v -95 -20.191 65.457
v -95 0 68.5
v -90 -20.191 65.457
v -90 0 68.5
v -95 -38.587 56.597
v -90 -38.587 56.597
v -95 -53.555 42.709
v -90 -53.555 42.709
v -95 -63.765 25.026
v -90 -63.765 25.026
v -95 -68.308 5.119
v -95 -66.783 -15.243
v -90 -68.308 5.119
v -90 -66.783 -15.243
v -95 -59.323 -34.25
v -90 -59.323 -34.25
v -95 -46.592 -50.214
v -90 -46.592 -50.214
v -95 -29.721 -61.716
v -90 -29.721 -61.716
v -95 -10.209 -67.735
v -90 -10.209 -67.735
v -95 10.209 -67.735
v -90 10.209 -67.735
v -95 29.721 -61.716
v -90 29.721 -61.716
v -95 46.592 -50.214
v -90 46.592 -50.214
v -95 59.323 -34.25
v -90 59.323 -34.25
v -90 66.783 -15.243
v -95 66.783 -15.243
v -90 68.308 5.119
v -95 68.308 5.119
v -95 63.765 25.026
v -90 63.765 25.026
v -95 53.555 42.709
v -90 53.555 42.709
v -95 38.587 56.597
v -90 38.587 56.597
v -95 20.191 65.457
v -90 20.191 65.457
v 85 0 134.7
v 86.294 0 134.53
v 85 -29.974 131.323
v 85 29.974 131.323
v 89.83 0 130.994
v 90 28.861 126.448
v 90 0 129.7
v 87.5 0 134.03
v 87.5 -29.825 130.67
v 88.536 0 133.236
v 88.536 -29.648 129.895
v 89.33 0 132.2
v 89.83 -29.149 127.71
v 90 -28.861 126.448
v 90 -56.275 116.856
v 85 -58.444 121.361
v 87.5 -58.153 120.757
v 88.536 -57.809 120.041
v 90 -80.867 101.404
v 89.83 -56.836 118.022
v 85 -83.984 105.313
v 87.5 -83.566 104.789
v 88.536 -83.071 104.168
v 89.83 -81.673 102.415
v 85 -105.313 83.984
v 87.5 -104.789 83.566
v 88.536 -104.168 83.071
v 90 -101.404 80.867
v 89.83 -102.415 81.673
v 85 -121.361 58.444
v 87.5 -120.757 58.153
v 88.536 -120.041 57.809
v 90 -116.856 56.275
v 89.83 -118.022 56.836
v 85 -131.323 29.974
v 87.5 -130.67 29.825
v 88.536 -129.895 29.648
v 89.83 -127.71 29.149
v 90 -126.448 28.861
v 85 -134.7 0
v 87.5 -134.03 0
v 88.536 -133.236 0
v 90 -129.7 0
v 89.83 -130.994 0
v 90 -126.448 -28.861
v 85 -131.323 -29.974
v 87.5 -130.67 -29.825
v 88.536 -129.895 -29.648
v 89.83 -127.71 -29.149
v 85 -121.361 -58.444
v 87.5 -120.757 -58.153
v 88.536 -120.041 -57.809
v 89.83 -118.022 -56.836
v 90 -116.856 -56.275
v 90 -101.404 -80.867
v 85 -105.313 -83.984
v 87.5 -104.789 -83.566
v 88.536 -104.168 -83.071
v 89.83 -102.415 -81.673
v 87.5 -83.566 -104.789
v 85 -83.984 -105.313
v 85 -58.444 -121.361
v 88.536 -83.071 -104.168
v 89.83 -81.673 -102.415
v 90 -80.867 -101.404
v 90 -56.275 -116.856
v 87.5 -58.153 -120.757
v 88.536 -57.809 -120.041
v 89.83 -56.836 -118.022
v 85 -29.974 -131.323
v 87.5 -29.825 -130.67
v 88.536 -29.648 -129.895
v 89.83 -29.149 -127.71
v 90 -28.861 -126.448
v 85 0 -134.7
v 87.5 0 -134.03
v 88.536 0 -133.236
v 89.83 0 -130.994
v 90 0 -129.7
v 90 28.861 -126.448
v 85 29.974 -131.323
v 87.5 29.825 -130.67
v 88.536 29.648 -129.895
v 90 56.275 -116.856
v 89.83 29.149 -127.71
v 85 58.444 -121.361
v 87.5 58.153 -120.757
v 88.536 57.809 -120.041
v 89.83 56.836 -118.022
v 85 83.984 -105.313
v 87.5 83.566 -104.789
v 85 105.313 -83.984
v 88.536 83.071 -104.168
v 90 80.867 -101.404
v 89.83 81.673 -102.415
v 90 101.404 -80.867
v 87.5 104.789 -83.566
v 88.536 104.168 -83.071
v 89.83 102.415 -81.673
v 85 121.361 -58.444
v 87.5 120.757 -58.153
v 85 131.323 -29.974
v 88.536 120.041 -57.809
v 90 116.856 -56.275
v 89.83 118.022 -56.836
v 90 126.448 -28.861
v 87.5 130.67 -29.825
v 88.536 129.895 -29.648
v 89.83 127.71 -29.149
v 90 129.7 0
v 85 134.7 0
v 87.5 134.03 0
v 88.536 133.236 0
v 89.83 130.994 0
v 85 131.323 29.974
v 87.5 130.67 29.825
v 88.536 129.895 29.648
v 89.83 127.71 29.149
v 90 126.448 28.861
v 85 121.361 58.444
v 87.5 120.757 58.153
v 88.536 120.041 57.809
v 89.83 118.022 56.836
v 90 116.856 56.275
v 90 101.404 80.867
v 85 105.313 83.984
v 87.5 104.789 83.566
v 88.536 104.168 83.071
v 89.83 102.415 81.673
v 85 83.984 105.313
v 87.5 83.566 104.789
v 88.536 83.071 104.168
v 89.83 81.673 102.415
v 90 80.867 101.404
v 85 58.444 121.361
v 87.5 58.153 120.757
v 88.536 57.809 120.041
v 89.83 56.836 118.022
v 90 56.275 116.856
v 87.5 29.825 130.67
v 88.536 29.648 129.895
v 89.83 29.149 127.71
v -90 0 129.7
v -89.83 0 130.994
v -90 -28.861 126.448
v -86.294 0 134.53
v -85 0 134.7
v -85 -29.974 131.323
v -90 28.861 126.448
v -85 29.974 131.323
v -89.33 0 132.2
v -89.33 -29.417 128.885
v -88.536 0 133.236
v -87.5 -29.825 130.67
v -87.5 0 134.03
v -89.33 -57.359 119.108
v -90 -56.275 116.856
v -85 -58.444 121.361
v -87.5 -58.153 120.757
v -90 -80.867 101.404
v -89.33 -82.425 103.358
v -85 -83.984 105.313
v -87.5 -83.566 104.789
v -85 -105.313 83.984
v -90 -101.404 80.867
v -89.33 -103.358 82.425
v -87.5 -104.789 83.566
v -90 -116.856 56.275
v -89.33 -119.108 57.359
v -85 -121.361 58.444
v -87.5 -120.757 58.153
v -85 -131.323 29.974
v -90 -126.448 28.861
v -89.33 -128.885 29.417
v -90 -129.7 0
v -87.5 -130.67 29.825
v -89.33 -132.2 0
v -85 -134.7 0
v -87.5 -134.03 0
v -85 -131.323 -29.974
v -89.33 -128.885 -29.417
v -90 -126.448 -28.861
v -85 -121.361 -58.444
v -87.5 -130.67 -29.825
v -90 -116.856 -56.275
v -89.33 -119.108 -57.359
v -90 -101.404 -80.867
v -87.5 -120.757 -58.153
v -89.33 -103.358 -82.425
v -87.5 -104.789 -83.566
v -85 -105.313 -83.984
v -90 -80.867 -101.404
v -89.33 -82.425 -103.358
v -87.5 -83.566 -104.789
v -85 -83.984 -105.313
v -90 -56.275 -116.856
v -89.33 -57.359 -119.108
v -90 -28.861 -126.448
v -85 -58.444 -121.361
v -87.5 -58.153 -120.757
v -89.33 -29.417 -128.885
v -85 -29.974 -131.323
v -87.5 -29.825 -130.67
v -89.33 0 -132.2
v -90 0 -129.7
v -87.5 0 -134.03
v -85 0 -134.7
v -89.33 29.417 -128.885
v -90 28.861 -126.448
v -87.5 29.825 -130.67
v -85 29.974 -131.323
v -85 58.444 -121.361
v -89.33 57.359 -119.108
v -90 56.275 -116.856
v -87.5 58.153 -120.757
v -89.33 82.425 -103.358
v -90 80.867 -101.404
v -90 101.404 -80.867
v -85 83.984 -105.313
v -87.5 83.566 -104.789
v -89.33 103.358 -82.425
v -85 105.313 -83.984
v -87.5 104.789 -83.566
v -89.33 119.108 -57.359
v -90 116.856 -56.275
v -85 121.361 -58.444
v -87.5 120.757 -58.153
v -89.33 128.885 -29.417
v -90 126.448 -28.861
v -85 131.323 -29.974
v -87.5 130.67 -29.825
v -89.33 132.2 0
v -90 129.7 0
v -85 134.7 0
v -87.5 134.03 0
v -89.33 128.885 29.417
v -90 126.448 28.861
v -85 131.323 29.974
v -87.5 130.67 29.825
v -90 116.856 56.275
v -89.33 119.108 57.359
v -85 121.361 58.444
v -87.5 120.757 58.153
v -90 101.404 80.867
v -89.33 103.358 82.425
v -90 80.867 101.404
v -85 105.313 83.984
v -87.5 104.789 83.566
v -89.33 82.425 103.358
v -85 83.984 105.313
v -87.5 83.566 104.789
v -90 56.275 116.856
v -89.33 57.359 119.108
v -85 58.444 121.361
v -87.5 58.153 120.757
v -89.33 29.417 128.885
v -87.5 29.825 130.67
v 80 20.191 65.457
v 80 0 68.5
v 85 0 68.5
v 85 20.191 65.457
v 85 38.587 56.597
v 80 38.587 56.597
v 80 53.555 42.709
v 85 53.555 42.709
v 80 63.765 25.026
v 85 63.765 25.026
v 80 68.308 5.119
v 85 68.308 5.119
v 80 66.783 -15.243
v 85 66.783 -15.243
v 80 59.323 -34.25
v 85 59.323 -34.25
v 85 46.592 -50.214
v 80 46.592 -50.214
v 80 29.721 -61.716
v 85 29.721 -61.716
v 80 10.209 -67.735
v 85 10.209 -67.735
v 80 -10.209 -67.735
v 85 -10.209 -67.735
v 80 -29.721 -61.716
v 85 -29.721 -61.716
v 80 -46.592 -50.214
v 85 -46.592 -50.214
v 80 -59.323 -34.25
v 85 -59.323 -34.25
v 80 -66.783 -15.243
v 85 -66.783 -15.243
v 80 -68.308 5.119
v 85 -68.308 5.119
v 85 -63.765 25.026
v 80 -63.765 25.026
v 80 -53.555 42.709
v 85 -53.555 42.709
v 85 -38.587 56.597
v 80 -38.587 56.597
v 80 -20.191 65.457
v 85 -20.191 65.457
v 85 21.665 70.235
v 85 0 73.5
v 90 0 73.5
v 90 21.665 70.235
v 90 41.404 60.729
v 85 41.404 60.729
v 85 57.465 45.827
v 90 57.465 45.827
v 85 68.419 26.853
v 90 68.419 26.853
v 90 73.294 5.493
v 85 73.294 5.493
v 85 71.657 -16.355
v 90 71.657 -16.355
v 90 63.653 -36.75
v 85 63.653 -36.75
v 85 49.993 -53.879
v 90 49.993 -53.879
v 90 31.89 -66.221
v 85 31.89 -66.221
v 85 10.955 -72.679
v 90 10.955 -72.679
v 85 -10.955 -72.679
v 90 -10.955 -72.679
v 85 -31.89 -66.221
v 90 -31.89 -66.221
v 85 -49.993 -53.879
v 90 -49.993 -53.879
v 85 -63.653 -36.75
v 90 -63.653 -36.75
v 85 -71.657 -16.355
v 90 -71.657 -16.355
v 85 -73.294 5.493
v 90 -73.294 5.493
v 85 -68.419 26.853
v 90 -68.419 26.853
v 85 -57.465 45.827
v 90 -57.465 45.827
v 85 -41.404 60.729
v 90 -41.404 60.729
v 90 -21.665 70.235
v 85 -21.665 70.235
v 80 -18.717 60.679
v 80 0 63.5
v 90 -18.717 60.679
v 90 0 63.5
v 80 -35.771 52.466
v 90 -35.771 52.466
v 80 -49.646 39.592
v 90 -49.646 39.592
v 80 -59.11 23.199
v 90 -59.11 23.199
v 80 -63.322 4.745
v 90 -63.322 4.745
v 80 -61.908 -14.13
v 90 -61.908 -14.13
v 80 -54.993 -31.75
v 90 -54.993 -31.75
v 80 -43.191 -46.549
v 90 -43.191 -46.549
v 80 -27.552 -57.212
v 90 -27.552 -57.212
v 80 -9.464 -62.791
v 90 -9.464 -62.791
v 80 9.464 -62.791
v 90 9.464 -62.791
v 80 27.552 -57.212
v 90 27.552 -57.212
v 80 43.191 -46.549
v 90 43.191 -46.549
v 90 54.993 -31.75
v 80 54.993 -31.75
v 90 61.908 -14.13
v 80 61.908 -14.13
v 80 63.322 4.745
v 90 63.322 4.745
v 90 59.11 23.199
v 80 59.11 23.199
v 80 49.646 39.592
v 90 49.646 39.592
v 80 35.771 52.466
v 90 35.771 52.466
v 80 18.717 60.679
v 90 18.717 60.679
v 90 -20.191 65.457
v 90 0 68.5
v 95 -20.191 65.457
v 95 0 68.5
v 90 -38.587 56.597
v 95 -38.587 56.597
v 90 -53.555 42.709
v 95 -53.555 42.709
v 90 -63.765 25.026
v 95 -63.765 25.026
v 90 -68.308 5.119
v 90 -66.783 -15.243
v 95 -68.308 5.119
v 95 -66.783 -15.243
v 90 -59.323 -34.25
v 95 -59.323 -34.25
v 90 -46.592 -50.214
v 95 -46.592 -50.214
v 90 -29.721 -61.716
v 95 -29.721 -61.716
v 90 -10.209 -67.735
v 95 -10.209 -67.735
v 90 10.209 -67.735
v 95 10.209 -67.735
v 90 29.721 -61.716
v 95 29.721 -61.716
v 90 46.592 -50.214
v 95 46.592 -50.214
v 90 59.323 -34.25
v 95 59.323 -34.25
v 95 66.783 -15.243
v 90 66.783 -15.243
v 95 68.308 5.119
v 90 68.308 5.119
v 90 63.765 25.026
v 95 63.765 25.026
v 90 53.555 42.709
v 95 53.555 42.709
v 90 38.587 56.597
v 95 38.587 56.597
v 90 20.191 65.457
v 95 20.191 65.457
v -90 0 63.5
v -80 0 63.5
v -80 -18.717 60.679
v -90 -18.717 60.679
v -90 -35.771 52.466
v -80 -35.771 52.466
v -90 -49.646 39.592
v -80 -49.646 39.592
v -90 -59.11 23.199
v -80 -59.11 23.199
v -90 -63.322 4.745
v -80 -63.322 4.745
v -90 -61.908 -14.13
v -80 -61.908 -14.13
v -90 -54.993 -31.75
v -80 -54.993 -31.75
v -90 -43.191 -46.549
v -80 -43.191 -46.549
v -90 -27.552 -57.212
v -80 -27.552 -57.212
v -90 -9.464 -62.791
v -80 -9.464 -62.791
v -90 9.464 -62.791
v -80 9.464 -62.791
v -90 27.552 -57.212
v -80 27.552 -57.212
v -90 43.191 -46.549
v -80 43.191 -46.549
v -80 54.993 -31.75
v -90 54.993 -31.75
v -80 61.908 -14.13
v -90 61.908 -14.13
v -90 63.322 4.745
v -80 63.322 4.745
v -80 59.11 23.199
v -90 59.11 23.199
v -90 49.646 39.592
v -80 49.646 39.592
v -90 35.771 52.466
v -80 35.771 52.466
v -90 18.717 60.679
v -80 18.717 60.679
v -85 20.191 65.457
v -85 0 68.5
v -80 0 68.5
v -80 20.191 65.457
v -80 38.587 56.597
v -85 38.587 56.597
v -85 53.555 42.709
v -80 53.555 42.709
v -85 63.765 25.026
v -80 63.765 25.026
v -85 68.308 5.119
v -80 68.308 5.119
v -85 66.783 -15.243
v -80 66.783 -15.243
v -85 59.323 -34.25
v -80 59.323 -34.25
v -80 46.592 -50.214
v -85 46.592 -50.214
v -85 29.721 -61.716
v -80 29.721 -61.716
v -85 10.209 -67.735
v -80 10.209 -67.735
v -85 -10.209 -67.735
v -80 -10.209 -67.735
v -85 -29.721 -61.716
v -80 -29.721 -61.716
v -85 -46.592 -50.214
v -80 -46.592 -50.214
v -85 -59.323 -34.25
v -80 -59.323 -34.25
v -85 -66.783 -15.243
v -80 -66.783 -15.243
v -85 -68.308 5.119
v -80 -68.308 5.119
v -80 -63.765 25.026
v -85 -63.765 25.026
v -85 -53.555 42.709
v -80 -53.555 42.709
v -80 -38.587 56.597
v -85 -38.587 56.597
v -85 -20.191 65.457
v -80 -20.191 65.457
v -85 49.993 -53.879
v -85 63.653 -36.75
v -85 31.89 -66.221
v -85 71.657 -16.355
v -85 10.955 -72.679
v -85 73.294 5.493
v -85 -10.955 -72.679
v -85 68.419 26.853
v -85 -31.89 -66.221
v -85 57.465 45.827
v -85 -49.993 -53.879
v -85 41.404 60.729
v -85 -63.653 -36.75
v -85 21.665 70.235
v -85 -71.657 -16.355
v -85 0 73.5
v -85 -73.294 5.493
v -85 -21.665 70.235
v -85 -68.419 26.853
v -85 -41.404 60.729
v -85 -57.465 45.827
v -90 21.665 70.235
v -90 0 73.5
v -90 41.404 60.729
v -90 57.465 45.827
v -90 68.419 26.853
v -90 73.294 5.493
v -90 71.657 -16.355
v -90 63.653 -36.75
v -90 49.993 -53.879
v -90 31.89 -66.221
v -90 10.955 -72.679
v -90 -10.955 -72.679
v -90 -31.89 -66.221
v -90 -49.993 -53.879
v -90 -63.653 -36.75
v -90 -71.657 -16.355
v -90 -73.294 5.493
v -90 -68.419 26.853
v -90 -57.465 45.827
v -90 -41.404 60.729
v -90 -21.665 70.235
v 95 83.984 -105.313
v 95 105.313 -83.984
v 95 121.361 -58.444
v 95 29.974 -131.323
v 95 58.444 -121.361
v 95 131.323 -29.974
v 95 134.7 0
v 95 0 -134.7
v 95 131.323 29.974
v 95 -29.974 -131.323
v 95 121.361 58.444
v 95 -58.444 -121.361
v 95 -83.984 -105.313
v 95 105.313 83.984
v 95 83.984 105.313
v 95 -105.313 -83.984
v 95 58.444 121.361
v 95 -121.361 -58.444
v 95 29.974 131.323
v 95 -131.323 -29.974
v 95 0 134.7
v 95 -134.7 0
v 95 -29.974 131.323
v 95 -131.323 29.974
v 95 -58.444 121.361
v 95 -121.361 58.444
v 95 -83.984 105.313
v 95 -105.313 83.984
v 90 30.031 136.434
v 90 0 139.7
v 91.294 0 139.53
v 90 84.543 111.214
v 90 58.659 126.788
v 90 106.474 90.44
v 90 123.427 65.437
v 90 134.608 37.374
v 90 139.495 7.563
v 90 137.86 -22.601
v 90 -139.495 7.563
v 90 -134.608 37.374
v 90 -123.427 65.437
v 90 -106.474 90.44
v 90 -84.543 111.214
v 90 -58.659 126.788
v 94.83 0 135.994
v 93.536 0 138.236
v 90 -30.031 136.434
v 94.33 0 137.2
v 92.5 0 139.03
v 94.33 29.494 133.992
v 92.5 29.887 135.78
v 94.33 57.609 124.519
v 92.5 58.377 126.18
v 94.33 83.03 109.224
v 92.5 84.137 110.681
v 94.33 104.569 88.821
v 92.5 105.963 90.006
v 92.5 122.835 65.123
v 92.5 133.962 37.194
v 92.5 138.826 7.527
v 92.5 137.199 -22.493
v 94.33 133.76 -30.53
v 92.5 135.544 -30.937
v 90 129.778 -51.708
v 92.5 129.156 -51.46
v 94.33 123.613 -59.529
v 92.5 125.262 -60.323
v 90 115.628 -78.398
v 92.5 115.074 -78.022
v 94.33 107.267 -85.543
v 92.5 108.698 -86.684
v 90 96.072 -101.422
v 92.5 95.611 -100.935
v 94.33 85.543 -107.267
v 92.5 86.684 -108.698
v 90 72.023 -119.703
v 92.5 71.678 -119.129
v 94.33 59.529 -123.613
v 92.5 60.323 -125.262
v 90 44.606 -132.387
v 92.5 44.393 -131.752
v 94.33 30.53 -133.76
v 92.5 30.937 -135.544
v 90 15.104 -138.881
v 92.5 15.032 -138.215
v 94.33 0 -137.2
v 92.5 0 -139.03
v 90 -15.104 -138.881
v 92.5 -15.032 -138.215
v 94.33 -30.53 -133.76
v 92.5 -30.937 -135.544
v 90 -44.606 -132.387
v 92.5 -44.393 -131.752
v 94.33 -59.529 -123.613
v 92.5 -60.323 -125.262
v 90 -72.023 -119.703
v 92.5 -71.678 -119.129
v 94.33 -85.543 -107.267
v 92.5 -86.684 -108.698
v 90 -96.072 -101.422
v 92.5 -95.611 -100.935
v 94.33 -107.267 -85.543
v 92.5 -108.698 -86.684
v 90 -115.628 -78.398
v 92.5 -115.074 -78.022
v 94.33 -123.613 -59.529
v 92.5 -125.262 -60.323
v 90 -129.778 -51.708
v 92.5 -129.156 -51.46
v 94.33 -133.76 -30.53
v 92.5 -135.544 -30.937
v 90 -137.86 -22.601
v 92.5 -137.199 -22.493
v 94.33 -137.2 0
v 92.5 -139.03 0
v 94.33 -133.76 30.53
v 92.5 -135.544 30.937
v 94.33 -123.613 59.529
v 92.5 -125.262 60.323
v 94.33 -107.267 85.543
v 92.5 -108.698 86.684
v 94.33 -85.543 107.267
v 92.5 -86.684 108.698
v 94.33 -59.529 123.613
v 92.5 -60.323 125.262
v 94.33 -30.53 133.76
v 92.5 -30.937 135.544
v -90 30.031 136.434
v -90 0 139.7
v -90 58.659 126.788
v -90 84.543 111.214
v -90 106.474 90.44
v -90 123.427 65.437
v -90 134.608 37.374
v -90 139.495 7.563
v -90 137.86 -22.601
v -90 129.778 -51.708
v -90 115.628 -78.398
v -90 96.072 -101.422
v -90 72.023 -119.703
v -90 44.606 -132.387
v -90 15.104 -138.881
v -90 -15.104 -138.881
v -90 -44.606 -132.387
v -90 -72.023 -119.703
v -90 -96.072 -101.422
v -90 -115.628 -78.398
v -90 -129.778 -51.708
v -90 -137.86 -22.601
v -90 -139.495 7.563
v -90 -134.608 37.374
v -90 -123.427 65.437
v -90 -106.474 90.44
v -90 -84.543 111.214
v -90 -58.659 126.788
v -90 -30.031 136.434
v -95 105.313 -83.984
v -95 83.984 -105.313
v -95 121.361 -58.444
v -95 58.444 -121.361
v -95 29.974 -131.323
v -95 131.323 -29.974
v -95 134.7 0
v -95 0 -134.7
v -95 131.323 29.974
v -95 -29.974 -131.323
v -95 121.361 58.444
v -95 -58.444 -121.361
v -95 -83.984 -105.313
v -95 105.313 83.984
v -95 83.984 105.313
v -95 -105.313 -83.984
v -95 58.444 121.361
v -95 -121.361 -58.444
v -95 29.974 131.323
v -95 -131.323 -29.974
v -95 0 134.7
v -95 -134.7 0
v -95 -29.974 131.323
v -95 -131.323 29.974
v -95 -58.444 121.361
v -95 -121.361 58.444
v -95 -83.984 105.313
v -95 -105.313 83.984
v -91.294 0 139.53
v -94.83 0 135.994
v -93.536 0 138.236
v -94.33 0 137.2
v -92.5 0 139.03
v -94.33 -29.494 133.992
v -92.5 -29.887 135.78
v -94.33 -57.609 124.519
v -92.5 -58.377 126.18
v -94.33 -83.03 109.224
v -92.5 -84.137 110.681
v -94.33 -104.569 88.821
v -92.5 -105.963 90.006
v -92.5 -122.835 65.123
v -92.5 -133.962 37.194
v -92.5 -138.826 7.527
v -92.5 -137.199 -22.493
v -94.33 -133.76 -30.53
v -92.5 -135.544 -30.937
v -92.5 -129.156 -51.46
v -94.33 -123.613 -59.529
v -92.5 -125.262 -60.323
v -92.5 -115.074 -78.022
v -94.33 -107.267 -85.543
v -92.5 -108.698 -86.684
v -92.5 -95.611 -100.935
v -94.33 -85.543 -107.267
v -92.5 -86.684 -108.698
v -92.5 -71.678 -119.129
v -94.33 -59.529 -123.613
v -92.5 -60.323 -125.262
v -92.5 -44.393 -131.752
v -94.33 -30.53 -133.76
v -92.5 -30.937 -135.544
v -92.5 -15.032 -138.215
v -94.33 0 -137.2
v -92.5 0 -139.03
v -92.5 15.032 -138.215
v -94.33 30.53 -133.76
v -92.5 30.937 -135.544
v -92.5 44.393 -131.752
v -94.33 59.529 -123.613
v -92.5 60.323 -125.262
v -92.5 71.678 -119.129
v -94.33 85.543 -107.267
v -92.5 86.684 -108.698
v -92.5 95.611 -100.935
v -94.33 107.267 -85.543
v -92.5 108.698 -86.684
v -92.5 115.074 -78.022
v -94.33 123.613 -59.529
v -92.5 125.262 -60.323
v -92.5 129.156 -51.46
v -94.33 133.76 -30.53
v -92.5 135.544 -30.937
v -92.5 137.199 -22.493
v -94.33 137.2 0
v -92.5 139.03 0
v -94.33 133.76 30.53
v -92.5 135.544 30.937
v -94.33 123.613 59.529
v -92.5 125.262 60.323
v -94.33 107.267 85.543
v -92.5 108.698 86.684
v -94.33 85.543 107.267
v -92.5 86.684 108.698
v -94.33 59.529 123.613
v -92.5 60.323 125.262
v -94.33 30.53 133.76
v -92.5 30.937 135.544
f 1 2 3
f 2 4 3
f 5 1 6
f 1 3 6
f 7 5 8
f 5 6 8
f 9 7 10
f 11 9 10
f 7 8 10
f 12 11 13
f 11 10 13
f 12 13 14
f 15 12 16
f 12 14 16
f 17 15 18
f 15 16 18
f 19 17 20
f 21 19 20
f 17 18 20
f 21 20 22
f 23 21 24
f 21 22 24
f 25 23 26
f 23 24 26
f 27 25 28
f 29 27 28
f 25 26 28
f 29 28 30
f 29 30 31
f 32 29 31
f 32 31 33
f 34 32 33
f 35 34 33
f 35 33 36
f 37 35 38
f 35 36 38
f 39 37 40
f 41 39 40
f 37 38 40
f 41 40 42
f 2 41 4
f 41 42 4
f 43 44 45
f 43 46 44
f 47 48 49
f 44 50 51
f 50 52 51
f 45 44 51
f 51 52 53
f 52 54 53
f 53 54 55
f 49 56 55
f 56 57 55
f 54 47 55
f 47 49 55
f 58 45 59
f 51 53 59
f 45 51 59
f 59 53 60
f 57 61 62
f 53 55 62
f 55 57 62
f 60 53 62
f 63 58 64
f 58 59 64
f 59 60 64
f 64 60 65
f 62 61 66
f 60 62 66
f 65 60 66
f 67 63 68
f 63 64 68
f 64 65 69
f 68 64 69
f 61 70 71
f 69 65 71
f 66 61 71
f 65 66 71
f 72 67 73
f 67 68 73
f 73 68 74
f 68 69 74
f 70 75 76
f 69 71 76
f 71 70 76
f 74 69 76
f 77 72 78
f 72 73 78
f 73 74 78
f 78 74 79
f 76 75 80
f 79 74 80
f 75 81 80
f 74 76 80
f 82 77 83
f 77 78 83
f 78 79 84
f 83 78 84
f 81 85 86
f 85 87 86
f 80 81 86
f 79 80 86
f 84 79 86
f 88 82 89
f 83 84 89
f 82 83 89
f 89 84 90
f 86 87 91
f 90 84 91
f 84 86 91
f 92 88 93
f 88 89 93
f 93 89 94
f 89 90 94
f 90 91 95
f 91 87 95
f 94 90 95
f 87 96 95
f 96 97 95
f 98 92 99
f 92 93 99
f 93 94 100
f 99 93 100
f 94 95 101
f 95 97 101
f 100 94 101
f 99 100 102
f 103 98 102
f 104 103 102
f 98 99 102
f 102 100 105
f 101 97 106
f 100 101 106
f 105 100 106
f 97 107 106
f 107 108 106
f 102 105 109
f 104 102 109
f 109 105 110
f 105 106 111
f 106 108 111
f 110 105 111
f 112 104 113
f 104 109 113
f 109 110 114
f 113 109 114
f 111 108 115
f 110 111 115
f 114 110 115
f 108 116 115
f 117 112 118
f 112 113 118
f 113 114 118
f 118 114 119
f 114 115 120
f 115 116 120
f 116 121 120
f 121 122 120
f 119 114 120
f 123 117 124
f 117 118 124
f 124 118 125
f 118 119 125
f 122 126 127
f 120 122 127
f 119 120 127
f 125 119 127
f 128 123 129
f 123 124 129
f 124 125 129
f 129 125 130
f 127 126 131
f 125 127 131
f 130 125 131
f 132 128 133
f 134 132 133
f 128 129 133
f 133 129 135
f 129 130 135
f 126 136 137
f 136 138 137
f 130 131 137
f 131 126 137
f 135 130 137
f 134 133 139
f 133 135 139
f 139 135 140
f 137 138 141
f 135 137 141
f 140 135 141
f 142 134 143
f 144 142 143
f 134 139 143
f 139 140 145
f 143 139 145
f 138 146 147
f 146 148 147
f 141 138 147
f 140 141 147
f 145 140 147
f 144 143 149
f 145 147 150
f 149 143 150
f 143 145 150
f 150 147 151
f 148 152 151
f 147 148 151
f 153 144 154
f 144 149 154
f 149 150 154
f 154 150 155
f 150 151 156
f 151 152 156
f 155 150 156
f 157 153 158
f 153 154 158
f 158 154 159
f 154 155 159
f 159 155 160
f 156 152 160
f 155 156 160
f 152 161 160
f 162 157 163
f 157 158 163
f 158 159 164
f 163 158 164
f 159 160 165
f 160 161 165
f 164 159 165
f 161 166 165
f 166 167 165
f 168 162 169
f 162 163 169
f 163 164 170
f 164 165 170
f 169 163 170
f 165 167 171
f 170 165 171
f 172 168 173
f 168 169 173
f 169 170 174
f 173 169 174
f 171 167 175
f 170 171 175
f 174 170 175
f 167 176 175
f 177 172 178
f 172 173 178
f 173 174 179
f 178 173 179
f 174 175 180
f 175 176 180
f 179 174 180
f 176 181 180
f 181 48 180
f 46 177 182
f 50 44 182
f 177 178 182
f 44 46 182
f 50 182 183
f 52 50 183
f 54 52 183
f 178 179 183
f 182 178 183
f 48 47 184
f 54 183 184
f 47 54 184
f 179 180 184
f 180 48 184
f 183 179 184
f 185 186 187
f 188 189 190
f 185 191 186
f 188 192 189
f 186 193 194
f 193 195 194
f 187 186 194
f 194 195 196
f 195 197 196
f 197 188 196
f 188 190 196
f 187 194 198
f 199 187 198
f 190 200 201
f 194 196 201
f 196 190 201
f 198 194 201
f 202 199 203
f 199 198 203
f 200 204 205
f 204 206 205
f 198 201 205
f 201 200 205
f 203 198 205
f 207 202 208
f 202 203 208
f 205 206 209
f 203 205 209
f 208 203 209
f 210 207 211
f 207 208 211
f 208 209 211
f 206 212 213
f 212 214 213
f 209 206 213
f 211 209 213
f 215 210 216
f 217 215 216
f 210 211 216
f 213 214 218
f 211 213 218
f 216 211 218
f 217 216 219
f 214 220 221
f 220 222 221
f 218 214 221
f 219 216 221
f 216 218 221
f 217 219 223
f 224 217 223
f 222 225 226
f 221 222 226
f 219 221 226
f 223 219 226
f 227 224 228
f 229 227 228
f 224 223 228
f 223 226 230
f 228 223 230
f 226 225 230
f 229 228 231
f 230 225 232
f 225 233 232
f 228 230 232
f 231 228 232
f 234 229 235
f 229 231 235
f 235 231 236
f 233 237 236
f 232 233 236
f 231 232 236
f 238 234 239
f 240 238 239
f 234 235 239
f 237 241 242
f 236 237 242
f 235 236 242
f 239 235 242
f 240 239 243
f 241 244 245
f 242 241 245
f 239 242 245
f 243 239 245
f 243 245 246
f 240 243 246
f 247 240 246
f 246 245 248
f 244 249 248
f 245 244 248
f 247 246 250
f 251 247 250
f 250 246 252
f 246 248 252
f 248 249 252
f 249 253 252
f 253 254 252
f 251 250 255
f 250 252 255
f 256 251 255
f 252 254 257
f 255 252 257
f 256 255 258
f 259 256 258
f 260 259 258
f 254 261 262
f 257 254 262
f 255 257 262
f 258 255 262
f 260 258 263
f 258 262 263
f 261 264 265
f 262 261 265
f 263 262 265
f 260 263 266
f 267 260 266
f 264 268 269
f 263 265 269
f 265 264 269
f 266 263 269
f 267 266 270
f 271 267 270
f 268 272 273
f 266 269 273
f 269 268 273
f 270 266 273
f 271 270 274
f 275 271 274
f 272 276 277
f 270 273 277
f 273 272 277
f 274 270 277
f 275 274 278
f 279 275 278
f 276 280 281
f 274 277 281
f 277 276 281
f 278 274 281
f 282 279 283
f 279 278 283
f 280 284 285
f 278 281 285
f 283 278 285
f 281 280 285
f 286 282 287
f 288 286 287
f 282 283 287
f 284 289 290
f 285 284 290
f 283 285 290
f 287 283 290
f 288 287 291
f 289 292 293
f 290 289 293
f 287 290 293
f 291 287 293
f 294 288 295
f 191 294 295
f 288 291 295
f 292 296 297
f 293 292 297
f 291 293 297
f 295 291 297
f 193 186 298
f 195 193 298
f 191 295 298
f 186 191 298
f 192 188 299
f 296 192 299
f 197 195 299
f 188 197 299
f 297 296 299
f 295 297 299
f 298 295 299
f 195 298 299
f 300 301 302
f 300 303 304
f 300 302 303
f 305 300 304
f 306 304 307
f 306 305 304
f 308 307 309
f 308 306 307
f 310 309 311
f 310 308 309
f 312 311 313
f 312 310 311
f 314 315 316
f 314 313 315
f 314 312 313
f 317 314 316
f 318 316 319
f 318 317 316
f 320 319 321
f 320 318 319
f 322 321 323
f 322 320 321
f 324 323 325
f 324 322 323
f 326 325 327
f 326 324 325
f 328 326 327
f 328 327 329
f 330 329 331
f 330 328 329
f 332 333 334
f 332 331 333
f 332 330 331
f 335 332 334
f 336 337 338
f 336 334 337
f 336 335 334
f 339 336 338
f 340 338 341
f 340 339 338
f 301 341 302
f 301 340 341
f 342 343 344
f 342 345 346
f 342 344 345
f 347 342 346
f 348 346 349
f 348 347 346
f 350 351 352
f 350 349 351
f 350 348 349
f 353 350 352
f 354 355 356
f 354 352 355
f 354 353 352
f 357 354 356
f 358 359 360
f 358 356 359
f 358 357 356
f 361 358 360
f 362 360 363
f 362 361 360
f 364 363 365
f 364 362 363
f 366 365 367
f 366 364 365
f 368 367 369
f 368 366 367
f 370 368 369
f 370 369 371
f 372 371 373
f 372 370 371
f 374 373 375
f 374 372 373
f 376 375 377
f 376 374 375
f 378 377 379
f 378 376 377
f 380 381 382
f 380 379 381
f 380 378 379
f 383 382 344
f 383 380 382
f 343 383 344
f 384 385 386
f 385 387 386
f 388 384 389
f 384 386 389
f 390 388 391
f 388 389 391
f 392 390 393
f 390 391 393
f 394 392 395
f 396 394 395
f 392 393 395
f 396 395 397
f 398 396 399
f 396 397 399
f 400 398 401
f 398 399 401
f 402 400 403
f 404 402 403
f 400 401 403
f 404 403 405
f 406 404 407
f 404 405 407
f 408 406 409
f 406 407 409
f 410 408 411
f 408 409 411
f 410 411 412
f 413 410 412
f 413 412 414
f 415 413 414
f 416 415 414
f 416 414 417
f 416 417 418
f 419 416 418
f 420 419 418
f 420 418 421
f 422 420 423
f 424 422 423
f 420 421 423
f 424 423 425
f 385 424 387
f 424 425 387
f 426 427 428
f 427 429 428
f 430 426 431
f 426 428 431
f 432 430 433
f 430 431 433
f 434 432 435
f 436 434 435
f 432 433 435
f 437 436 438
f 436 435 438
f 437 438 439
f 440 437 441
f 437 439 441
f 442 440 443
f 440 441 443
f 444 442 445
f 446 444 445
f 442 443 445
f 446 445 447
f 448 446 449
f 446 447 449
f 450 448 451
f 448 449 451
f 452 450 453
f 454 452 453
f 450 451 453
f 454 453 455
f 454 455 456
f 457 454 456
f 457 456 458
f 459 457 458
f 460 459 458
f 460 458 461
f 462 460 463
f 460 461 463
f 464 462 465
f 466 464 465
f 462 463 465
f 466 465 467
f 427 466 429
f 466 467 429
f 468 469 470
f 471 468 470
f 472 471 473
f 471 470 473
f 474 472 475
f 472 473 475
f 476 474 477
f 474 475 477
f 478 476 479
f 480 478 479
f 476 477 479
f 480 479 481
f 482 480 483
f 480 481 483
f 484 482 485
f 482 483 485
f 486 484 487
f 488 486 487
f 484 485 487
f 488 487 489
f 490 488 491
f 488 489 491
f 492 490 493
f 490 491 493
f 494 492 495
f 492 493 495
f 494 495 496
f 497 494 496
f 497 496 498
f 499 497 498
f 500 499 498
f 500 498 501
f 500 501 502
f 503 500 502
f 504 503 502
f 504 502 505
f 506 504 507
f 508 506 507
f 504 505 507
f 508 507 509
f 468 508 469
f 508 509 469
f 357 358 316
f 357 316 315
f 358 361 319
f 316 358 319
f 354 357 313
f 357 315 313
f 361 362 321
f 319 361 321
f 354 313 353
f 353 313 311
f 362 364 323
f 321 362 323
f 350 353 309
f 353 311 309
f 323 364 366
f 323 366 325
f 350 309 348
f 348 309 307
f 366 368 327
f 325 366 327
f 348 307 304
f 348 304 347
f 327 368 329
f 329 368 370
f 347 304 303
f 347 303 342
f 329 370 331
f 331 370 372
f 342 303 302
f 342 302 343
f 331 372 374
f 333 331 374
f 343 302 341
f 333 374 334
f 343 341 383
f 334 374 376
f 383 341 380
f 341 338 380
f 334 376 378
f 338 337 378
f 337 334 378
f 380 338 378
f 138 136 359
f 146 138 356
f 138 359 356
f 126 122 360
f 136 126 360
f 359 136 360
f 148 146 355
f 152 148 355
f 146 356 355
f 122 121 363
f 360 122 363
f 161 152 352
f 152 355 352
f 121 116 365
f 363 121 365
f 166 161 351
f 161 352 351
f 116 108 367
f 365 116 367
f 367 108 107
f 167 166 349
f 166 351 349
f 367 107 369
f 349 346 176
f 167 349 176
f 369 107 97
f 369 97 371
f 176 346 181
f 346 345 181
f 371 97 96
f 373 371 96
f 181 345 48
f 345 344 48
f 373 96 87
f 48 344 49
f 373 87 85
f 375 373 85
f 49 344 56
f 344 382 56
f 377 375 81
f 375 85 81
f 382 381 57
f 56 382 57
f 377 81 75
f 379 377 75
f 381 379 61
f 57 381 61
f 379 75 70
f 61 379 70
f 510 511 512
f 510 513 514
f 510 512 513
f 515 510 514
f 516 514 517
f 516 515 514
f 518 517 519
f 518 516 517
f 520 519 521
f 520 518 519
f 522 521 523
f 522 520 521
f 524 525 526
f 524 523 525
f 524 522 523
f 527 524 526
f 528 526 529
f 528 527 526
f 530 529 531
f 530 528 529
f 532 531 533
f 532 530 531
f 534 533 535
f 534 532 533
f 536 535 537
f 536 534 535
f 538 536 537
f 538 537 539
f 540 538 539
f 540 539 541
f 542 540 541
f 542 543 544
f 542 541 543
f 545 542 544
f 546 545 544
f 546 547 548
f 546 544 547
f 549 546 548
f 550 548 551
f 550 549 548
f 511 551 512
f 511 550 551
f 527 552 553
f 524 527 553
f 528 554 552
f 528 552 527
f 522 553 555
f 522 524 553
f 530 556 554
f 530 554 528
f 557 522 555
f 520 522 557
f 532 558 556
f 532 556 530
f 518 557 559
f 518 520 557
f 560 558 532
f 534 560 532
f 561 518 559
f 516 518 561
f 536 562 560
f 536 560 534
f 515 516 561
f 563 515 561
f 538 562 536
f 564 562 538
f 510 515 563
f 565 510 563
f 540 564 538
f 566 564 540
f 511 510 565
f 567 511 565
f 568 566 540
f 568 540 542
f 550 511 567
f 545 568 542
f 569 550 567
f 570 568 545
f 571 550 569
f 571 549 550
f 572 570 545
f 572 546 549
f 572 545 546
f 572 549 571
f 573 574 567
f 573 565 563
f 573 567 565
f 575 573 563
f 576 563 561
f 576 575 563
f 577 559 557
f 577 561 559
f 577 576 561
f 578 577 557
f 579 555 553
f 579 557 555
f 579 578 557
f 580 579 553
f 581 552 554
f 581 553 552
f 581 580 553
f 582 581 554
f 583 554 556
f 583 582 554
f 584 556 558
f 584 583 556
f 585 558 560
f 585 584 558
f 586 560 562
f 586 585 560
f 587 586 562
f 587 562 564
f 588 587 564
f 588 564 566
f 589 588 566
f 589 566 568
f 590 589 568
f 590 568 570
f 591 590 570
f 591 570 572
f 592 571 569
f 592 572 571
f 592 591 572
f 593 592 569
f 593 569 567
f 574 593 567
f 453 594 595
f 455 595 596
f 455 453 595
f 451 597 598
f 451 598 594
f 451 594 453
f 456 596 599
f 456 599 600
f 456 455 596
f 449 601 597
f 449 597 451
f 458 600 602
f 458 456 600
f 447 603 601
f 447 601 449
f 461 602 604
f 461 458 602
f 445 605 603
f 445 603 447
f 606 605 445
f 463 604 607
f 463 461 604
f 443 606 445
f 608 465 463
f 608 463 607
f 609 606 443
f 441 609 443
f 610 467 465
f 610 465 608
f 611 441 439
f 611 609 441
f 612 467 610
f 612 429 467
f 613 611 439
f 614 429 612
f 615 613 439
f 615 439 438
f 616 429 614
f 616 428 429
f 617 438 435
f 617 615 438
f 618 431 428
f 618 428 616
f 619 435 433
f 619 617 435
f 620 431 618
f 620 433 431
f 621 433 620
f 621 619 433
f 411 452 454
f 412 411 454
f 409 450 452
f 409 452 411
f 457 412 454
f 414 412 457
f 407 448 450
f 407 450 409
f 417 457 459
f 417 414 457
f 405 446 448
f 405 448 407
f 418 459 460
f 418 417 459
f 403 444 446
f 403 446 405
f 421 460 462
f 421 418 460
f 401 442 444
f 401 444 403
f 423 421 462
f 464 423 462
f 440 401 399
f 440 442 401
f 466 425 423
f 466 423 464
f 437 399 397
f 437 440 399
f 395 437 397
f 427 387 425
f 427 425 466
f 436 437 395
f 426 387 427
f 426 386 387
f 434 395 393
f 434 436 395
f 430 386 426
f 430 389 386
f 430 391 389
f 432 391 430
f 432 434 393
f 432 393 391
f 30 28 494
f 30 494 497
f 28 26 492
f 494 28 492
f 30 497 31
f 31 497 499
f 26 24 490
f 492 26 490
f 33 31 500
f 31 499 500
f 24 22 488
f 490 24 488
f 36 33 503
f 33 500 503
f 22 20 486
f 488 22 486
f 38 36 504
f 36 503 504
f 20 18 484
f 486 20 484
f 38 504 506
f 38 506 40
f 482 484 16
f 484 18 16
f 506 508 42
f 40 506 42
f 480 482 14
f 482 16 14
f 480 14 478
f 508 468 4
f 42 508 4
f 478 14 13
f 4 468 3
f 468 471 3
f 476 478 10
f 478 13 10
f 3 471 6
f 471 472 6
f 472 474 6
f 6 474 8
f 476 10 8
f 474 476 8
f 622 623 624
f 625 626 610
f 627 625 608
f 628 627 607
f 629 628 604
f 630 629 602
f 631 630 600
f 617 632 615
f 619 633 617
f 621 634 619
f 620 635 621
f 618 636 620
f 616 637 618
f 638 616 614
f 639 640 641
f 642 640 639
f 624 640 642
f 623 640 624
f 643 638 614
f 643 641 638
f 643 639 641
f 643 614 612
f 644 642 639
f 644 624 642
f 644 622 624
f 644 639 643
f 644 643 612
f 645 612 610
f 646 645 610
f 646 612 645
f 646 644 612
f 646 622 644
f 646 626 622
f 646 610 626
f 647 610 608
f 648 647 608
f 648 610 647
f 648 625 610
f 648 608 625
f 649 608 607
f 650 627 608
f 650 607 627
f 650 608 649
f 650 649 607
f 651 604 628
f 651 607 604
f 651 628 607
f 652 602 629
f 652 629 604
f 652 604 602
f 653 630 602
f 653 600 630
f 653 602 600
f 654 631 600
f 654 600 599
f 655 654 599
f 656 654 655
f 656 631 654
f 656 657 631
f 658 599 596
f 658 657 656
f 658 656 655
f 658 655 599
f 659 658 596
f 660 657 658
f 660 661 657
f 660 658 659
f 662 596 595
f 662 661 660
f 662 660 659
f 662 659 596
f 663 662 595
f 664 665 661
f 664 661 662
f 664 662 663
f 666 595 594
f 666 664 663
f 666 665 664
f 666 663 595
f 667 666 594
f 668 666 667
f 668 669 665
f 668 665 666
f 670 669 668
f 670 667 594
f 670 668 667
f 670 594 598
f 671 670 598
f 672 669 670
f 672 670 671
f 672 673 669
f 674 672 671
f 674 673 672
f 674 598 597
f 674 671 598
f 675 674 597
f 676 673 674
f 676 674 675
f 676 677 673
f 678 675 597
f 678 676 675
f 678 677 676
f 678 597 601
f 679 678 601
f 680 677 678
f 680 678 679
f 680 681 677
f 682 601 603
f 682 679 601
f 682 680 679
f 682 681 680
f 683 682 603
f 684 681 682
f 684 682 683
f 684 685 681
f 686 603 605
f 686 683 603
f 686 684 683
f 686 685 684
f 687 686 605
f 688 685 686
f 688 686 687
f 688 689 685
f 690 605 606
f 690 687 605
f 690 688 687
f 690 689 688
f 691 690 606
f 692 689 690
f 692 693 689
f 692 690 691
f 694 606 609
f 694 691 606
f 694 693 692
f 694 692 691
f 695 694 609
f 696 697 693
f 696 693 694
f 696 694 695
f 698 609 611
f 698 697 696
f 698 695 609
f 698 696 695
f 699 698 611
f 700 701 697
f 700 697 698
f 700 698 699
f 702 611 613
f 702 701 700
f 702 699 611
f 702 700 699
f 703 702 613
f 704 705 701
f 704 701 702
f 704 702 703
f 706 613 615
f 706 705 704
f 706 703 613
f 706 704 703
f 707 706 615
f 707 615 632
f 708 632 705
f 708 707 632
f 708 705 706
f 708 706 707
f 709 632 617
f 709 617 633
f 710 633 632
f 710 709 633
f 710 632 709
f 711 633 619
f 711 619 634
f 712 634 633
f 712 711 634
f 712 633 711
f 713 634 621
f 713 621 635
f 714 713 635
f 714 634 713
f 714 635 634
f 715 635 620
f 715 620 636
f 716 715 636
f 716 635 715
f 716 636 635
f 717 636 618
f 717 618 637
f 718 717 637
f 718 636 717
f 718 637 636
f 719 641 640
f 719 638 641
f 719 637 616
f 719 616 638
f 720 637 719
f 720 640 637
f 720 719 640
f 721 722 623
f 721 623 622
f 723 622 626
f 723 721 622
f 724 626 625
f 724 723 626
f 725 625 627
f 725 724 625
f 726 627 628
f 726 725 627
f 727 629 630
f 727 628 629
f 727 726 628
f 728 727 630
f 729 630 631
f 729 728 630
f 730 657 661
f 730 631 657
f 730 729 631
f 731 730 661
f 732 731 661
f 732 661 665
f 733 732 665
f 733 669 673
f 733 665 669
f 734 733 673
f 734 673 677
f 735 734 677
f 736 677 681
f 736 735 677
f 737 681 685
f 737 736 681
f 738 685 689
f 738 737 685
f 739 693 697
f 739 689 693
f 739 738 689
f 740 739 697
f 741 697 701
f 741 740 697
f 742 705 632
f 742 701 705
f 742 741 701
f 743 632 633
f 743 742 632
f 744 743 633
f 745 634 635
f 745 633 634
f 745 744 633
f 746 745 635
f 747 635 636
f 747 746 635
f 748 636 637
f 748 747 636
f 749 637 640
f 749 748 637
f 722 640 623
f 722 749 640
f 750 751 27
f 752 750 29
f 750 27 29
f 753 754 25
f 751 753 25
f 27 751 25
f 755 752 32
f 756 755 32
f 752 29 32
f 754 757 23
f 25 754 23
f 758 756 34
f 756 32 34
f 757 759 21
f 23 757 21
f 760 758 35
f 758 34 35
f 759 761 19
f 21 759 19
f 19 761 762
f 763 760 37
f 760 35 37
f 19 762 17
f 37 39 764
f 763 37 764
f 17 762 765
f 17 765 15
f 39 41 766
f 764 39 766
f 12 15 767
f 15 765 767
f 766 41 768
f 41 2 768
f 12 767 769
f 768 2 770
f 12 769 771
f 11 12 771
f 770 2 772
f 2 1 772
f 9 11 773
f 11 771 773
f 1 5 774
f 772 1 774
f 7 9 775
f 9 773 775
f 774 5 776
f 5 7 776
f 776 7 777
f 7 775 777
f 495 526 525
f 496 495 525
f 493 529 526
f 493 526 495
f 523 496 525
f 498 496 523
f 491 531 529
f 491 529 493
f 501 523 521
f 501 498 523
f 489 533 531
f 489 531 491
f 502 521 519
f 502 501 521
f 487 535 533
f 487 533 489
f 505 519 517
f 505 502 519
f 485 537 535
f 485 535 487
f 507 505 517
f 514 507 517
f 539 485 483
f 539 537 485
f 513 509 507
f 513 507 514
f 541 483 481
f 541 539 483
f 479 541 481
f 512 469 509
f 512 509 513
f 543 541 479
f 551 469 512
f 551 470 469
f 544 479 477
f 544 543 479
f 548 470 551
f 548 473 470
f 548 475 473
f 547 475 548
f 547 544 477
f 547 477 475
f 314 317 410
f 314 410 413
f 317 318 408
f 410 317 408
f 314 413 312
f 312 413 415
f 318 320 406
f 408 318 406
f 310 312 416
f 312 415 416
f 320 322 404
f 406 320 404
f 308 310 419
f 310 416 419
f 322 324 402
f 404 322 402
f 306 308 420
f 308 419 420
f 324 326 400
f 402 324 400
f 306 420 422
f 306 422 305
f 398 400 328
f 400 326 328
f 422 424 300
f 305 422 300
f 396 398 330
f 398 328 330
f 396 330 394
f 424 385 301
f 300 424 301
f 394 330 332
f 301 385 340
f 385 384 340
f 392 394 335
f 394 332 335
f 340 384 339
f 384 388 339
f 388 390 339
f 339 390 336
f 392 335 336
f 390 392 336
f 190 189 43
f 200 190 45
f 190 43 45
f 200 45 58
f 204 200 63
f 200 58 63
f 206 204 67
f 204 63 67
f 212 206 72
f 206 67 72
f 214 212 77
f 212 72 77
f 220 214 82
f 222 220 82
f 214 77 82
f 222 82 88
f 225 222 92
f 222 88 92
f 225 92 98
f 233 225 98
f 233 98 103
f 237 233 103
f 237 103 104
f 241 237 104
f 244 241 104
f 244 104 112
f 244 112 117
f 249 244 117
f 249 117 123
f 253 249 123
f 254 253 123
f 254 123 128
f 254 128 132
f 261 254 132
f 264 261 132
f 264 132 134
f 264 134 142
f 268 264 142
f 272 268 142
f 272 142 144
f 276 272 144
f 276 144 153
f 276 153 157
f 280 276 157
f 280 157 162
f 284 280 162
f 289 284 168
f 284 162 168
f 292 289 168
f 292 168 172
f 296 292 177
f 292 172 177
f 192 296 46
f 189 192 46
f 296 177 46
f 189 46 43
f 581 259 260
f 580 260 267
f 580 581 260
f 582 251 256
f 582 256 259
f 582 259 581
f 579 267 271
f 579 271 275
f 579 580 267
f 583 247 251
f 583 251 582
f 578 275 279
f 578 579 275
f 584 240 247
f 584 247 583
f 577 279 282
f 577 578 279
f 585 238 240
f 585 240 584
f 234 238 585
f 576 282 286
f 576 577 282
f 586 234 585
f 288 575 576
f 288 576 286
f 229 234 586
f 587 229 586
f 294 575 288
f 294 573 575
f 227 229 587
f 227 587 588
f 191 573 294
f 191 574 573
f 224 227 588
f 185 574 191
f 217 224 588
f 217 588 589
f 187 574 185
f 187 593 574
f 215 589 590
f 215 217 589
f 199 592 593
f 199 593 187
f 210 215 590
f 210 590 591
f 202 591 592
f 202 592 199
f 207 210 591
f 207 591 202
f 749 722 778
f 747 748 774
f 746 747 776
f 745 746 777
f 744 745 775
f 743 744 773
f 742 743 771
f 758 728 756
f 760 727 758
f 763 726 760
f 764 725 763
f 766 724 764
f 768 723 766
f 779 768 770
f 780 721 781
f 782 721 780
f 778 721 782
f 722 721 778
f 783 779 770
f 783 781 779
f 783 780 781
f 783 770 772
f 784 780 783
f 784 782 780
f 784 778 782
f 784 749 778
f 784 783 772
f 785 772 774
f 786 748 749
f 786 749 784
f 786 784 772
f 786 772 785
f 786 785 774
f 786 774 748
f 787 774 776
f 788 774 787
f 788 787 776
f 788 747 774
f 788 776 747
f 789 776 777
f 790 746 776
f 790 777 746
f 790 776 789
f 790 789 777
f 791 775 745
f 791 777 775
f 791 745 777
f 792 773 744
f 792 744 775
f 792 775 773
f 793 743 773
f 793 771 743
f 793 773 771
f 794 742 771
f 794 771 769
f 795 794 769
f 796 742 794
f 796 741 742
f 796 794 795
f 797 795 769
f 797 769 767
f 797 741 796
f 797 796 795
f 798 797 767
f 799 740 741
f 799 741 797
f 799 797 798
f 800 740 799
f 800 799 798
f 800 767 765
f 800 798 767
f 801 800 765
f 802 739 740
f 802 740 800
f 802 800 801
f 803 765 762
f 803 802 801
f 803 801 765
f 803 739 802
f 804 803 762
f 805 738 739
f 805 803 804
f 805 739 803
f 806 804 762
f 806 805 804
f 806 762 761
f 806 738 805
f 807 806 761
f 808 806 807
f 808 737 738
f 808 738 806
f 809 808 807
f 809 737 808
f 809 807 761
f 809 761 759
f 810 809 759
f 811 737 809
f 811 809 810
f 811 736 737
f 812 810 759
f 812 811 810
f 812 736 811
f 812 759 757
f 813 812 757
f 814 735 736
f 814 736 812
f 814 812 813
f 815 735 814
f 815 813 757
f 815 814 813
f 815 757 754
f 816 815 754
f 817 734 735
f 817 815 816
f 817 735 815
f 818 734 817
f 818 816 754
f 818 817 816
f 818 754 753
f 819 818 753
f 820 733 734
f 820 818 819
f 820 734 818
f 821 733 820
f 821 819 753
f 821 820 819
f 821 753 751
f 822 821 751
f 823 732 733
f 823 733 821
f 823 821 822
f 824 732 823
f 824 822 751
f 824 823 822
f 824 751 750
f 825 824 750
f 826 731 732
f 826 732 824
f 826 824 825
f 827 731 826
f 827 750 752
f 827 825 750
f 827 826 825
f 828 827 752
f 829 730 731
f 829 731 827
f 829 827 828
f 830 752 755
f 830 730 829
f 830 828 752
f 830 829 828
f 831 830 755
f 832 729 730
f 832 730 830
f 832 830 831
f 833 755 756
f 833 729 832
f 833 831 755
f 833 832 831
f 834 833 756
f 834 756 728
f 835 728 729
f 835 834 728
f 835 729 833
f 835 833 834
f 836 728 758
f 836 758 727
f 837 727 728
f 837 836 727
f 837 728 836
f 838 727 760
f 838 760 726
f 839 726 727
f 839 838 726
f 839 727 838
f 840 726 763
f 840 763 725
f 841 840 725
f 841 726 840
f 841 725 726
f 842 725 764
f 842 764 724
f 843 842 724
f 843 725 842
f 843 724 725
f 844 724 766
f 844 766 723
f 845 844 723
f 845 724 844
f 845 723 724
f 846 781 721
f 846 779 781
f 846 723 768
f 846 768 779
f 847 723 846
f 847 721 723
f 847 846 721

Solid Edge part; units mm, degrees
sketch "Sketch1" plane through (0, 0, 0) normal (0, -1, 0) x (1, 0, 0)
  line L0 (-95, 139.7) -> (-95, 68.5)
  line L1 (-95, 68.5) -> (-90, 68.5)
  line L2 (-90, 68.5) -> (-90, 63.5)
  line L3 (-90, 63.5) -> (-80, 63.5)
  line L4 (-80, 63.5) -> (-80, 68.5)
  line L5 (-80, 68.5) -> (-85, 68.5)
  line L6 (-85, 68.5) -> (-85, 73.5)
  line L7 (-85, 73.5) -> (-90, 73.5)
  line L8 (-90, 73.5) -> (-90, 134.7)
  line L9 (-90, 134.7) -> (90, 134.7)
  line L10 (90, 134.7) -> (90, 73.5)
  line L11 (90, 73.5) -> (85, 73.5)
  line L12 (85, 73.5) -> (85, 68.5)
  line L13 (85, 68.5) -> (80, 68.5)
  line L14 (80, 68.5) -> (80, 63.5)
  line L15 (80, 63.5) -> (90, 63.5)
  line L16 (90, 63.5) -> (90, 68.5)
  line L17 (90, 68.5) -> (95, 68.5)
  line L18 (95, 68.5) -> (95, 139.7)
  line L19 (95, 139.7) -> (-95, 139.7)
  dimension "D1" = 180
  dimension "D2" = 10
  dimension "D3" = 5
  dimension "D4" = 5
  dimension "D5" = 5
  dimension "D6" = 5
  dimension "D7" = 10
  dimension "D8" = 5
  dimension "D9" = 5
  dimension "D10" = 5
  dimension "D11" = 5
  dimension "D12" = 5
revolve "RevolvedProtrusion1" add sketch "Sketch1" angle 360 about axis through (-79.3986, 0, 0) along (1, 0, 0)
fillet "Round1" radius 5 4 edges at (95, 0, -139.7) (90, 0, -134.7) (-95, 0, -139.7) (-90, 0, -134.7)
properties material "Phenolic"
